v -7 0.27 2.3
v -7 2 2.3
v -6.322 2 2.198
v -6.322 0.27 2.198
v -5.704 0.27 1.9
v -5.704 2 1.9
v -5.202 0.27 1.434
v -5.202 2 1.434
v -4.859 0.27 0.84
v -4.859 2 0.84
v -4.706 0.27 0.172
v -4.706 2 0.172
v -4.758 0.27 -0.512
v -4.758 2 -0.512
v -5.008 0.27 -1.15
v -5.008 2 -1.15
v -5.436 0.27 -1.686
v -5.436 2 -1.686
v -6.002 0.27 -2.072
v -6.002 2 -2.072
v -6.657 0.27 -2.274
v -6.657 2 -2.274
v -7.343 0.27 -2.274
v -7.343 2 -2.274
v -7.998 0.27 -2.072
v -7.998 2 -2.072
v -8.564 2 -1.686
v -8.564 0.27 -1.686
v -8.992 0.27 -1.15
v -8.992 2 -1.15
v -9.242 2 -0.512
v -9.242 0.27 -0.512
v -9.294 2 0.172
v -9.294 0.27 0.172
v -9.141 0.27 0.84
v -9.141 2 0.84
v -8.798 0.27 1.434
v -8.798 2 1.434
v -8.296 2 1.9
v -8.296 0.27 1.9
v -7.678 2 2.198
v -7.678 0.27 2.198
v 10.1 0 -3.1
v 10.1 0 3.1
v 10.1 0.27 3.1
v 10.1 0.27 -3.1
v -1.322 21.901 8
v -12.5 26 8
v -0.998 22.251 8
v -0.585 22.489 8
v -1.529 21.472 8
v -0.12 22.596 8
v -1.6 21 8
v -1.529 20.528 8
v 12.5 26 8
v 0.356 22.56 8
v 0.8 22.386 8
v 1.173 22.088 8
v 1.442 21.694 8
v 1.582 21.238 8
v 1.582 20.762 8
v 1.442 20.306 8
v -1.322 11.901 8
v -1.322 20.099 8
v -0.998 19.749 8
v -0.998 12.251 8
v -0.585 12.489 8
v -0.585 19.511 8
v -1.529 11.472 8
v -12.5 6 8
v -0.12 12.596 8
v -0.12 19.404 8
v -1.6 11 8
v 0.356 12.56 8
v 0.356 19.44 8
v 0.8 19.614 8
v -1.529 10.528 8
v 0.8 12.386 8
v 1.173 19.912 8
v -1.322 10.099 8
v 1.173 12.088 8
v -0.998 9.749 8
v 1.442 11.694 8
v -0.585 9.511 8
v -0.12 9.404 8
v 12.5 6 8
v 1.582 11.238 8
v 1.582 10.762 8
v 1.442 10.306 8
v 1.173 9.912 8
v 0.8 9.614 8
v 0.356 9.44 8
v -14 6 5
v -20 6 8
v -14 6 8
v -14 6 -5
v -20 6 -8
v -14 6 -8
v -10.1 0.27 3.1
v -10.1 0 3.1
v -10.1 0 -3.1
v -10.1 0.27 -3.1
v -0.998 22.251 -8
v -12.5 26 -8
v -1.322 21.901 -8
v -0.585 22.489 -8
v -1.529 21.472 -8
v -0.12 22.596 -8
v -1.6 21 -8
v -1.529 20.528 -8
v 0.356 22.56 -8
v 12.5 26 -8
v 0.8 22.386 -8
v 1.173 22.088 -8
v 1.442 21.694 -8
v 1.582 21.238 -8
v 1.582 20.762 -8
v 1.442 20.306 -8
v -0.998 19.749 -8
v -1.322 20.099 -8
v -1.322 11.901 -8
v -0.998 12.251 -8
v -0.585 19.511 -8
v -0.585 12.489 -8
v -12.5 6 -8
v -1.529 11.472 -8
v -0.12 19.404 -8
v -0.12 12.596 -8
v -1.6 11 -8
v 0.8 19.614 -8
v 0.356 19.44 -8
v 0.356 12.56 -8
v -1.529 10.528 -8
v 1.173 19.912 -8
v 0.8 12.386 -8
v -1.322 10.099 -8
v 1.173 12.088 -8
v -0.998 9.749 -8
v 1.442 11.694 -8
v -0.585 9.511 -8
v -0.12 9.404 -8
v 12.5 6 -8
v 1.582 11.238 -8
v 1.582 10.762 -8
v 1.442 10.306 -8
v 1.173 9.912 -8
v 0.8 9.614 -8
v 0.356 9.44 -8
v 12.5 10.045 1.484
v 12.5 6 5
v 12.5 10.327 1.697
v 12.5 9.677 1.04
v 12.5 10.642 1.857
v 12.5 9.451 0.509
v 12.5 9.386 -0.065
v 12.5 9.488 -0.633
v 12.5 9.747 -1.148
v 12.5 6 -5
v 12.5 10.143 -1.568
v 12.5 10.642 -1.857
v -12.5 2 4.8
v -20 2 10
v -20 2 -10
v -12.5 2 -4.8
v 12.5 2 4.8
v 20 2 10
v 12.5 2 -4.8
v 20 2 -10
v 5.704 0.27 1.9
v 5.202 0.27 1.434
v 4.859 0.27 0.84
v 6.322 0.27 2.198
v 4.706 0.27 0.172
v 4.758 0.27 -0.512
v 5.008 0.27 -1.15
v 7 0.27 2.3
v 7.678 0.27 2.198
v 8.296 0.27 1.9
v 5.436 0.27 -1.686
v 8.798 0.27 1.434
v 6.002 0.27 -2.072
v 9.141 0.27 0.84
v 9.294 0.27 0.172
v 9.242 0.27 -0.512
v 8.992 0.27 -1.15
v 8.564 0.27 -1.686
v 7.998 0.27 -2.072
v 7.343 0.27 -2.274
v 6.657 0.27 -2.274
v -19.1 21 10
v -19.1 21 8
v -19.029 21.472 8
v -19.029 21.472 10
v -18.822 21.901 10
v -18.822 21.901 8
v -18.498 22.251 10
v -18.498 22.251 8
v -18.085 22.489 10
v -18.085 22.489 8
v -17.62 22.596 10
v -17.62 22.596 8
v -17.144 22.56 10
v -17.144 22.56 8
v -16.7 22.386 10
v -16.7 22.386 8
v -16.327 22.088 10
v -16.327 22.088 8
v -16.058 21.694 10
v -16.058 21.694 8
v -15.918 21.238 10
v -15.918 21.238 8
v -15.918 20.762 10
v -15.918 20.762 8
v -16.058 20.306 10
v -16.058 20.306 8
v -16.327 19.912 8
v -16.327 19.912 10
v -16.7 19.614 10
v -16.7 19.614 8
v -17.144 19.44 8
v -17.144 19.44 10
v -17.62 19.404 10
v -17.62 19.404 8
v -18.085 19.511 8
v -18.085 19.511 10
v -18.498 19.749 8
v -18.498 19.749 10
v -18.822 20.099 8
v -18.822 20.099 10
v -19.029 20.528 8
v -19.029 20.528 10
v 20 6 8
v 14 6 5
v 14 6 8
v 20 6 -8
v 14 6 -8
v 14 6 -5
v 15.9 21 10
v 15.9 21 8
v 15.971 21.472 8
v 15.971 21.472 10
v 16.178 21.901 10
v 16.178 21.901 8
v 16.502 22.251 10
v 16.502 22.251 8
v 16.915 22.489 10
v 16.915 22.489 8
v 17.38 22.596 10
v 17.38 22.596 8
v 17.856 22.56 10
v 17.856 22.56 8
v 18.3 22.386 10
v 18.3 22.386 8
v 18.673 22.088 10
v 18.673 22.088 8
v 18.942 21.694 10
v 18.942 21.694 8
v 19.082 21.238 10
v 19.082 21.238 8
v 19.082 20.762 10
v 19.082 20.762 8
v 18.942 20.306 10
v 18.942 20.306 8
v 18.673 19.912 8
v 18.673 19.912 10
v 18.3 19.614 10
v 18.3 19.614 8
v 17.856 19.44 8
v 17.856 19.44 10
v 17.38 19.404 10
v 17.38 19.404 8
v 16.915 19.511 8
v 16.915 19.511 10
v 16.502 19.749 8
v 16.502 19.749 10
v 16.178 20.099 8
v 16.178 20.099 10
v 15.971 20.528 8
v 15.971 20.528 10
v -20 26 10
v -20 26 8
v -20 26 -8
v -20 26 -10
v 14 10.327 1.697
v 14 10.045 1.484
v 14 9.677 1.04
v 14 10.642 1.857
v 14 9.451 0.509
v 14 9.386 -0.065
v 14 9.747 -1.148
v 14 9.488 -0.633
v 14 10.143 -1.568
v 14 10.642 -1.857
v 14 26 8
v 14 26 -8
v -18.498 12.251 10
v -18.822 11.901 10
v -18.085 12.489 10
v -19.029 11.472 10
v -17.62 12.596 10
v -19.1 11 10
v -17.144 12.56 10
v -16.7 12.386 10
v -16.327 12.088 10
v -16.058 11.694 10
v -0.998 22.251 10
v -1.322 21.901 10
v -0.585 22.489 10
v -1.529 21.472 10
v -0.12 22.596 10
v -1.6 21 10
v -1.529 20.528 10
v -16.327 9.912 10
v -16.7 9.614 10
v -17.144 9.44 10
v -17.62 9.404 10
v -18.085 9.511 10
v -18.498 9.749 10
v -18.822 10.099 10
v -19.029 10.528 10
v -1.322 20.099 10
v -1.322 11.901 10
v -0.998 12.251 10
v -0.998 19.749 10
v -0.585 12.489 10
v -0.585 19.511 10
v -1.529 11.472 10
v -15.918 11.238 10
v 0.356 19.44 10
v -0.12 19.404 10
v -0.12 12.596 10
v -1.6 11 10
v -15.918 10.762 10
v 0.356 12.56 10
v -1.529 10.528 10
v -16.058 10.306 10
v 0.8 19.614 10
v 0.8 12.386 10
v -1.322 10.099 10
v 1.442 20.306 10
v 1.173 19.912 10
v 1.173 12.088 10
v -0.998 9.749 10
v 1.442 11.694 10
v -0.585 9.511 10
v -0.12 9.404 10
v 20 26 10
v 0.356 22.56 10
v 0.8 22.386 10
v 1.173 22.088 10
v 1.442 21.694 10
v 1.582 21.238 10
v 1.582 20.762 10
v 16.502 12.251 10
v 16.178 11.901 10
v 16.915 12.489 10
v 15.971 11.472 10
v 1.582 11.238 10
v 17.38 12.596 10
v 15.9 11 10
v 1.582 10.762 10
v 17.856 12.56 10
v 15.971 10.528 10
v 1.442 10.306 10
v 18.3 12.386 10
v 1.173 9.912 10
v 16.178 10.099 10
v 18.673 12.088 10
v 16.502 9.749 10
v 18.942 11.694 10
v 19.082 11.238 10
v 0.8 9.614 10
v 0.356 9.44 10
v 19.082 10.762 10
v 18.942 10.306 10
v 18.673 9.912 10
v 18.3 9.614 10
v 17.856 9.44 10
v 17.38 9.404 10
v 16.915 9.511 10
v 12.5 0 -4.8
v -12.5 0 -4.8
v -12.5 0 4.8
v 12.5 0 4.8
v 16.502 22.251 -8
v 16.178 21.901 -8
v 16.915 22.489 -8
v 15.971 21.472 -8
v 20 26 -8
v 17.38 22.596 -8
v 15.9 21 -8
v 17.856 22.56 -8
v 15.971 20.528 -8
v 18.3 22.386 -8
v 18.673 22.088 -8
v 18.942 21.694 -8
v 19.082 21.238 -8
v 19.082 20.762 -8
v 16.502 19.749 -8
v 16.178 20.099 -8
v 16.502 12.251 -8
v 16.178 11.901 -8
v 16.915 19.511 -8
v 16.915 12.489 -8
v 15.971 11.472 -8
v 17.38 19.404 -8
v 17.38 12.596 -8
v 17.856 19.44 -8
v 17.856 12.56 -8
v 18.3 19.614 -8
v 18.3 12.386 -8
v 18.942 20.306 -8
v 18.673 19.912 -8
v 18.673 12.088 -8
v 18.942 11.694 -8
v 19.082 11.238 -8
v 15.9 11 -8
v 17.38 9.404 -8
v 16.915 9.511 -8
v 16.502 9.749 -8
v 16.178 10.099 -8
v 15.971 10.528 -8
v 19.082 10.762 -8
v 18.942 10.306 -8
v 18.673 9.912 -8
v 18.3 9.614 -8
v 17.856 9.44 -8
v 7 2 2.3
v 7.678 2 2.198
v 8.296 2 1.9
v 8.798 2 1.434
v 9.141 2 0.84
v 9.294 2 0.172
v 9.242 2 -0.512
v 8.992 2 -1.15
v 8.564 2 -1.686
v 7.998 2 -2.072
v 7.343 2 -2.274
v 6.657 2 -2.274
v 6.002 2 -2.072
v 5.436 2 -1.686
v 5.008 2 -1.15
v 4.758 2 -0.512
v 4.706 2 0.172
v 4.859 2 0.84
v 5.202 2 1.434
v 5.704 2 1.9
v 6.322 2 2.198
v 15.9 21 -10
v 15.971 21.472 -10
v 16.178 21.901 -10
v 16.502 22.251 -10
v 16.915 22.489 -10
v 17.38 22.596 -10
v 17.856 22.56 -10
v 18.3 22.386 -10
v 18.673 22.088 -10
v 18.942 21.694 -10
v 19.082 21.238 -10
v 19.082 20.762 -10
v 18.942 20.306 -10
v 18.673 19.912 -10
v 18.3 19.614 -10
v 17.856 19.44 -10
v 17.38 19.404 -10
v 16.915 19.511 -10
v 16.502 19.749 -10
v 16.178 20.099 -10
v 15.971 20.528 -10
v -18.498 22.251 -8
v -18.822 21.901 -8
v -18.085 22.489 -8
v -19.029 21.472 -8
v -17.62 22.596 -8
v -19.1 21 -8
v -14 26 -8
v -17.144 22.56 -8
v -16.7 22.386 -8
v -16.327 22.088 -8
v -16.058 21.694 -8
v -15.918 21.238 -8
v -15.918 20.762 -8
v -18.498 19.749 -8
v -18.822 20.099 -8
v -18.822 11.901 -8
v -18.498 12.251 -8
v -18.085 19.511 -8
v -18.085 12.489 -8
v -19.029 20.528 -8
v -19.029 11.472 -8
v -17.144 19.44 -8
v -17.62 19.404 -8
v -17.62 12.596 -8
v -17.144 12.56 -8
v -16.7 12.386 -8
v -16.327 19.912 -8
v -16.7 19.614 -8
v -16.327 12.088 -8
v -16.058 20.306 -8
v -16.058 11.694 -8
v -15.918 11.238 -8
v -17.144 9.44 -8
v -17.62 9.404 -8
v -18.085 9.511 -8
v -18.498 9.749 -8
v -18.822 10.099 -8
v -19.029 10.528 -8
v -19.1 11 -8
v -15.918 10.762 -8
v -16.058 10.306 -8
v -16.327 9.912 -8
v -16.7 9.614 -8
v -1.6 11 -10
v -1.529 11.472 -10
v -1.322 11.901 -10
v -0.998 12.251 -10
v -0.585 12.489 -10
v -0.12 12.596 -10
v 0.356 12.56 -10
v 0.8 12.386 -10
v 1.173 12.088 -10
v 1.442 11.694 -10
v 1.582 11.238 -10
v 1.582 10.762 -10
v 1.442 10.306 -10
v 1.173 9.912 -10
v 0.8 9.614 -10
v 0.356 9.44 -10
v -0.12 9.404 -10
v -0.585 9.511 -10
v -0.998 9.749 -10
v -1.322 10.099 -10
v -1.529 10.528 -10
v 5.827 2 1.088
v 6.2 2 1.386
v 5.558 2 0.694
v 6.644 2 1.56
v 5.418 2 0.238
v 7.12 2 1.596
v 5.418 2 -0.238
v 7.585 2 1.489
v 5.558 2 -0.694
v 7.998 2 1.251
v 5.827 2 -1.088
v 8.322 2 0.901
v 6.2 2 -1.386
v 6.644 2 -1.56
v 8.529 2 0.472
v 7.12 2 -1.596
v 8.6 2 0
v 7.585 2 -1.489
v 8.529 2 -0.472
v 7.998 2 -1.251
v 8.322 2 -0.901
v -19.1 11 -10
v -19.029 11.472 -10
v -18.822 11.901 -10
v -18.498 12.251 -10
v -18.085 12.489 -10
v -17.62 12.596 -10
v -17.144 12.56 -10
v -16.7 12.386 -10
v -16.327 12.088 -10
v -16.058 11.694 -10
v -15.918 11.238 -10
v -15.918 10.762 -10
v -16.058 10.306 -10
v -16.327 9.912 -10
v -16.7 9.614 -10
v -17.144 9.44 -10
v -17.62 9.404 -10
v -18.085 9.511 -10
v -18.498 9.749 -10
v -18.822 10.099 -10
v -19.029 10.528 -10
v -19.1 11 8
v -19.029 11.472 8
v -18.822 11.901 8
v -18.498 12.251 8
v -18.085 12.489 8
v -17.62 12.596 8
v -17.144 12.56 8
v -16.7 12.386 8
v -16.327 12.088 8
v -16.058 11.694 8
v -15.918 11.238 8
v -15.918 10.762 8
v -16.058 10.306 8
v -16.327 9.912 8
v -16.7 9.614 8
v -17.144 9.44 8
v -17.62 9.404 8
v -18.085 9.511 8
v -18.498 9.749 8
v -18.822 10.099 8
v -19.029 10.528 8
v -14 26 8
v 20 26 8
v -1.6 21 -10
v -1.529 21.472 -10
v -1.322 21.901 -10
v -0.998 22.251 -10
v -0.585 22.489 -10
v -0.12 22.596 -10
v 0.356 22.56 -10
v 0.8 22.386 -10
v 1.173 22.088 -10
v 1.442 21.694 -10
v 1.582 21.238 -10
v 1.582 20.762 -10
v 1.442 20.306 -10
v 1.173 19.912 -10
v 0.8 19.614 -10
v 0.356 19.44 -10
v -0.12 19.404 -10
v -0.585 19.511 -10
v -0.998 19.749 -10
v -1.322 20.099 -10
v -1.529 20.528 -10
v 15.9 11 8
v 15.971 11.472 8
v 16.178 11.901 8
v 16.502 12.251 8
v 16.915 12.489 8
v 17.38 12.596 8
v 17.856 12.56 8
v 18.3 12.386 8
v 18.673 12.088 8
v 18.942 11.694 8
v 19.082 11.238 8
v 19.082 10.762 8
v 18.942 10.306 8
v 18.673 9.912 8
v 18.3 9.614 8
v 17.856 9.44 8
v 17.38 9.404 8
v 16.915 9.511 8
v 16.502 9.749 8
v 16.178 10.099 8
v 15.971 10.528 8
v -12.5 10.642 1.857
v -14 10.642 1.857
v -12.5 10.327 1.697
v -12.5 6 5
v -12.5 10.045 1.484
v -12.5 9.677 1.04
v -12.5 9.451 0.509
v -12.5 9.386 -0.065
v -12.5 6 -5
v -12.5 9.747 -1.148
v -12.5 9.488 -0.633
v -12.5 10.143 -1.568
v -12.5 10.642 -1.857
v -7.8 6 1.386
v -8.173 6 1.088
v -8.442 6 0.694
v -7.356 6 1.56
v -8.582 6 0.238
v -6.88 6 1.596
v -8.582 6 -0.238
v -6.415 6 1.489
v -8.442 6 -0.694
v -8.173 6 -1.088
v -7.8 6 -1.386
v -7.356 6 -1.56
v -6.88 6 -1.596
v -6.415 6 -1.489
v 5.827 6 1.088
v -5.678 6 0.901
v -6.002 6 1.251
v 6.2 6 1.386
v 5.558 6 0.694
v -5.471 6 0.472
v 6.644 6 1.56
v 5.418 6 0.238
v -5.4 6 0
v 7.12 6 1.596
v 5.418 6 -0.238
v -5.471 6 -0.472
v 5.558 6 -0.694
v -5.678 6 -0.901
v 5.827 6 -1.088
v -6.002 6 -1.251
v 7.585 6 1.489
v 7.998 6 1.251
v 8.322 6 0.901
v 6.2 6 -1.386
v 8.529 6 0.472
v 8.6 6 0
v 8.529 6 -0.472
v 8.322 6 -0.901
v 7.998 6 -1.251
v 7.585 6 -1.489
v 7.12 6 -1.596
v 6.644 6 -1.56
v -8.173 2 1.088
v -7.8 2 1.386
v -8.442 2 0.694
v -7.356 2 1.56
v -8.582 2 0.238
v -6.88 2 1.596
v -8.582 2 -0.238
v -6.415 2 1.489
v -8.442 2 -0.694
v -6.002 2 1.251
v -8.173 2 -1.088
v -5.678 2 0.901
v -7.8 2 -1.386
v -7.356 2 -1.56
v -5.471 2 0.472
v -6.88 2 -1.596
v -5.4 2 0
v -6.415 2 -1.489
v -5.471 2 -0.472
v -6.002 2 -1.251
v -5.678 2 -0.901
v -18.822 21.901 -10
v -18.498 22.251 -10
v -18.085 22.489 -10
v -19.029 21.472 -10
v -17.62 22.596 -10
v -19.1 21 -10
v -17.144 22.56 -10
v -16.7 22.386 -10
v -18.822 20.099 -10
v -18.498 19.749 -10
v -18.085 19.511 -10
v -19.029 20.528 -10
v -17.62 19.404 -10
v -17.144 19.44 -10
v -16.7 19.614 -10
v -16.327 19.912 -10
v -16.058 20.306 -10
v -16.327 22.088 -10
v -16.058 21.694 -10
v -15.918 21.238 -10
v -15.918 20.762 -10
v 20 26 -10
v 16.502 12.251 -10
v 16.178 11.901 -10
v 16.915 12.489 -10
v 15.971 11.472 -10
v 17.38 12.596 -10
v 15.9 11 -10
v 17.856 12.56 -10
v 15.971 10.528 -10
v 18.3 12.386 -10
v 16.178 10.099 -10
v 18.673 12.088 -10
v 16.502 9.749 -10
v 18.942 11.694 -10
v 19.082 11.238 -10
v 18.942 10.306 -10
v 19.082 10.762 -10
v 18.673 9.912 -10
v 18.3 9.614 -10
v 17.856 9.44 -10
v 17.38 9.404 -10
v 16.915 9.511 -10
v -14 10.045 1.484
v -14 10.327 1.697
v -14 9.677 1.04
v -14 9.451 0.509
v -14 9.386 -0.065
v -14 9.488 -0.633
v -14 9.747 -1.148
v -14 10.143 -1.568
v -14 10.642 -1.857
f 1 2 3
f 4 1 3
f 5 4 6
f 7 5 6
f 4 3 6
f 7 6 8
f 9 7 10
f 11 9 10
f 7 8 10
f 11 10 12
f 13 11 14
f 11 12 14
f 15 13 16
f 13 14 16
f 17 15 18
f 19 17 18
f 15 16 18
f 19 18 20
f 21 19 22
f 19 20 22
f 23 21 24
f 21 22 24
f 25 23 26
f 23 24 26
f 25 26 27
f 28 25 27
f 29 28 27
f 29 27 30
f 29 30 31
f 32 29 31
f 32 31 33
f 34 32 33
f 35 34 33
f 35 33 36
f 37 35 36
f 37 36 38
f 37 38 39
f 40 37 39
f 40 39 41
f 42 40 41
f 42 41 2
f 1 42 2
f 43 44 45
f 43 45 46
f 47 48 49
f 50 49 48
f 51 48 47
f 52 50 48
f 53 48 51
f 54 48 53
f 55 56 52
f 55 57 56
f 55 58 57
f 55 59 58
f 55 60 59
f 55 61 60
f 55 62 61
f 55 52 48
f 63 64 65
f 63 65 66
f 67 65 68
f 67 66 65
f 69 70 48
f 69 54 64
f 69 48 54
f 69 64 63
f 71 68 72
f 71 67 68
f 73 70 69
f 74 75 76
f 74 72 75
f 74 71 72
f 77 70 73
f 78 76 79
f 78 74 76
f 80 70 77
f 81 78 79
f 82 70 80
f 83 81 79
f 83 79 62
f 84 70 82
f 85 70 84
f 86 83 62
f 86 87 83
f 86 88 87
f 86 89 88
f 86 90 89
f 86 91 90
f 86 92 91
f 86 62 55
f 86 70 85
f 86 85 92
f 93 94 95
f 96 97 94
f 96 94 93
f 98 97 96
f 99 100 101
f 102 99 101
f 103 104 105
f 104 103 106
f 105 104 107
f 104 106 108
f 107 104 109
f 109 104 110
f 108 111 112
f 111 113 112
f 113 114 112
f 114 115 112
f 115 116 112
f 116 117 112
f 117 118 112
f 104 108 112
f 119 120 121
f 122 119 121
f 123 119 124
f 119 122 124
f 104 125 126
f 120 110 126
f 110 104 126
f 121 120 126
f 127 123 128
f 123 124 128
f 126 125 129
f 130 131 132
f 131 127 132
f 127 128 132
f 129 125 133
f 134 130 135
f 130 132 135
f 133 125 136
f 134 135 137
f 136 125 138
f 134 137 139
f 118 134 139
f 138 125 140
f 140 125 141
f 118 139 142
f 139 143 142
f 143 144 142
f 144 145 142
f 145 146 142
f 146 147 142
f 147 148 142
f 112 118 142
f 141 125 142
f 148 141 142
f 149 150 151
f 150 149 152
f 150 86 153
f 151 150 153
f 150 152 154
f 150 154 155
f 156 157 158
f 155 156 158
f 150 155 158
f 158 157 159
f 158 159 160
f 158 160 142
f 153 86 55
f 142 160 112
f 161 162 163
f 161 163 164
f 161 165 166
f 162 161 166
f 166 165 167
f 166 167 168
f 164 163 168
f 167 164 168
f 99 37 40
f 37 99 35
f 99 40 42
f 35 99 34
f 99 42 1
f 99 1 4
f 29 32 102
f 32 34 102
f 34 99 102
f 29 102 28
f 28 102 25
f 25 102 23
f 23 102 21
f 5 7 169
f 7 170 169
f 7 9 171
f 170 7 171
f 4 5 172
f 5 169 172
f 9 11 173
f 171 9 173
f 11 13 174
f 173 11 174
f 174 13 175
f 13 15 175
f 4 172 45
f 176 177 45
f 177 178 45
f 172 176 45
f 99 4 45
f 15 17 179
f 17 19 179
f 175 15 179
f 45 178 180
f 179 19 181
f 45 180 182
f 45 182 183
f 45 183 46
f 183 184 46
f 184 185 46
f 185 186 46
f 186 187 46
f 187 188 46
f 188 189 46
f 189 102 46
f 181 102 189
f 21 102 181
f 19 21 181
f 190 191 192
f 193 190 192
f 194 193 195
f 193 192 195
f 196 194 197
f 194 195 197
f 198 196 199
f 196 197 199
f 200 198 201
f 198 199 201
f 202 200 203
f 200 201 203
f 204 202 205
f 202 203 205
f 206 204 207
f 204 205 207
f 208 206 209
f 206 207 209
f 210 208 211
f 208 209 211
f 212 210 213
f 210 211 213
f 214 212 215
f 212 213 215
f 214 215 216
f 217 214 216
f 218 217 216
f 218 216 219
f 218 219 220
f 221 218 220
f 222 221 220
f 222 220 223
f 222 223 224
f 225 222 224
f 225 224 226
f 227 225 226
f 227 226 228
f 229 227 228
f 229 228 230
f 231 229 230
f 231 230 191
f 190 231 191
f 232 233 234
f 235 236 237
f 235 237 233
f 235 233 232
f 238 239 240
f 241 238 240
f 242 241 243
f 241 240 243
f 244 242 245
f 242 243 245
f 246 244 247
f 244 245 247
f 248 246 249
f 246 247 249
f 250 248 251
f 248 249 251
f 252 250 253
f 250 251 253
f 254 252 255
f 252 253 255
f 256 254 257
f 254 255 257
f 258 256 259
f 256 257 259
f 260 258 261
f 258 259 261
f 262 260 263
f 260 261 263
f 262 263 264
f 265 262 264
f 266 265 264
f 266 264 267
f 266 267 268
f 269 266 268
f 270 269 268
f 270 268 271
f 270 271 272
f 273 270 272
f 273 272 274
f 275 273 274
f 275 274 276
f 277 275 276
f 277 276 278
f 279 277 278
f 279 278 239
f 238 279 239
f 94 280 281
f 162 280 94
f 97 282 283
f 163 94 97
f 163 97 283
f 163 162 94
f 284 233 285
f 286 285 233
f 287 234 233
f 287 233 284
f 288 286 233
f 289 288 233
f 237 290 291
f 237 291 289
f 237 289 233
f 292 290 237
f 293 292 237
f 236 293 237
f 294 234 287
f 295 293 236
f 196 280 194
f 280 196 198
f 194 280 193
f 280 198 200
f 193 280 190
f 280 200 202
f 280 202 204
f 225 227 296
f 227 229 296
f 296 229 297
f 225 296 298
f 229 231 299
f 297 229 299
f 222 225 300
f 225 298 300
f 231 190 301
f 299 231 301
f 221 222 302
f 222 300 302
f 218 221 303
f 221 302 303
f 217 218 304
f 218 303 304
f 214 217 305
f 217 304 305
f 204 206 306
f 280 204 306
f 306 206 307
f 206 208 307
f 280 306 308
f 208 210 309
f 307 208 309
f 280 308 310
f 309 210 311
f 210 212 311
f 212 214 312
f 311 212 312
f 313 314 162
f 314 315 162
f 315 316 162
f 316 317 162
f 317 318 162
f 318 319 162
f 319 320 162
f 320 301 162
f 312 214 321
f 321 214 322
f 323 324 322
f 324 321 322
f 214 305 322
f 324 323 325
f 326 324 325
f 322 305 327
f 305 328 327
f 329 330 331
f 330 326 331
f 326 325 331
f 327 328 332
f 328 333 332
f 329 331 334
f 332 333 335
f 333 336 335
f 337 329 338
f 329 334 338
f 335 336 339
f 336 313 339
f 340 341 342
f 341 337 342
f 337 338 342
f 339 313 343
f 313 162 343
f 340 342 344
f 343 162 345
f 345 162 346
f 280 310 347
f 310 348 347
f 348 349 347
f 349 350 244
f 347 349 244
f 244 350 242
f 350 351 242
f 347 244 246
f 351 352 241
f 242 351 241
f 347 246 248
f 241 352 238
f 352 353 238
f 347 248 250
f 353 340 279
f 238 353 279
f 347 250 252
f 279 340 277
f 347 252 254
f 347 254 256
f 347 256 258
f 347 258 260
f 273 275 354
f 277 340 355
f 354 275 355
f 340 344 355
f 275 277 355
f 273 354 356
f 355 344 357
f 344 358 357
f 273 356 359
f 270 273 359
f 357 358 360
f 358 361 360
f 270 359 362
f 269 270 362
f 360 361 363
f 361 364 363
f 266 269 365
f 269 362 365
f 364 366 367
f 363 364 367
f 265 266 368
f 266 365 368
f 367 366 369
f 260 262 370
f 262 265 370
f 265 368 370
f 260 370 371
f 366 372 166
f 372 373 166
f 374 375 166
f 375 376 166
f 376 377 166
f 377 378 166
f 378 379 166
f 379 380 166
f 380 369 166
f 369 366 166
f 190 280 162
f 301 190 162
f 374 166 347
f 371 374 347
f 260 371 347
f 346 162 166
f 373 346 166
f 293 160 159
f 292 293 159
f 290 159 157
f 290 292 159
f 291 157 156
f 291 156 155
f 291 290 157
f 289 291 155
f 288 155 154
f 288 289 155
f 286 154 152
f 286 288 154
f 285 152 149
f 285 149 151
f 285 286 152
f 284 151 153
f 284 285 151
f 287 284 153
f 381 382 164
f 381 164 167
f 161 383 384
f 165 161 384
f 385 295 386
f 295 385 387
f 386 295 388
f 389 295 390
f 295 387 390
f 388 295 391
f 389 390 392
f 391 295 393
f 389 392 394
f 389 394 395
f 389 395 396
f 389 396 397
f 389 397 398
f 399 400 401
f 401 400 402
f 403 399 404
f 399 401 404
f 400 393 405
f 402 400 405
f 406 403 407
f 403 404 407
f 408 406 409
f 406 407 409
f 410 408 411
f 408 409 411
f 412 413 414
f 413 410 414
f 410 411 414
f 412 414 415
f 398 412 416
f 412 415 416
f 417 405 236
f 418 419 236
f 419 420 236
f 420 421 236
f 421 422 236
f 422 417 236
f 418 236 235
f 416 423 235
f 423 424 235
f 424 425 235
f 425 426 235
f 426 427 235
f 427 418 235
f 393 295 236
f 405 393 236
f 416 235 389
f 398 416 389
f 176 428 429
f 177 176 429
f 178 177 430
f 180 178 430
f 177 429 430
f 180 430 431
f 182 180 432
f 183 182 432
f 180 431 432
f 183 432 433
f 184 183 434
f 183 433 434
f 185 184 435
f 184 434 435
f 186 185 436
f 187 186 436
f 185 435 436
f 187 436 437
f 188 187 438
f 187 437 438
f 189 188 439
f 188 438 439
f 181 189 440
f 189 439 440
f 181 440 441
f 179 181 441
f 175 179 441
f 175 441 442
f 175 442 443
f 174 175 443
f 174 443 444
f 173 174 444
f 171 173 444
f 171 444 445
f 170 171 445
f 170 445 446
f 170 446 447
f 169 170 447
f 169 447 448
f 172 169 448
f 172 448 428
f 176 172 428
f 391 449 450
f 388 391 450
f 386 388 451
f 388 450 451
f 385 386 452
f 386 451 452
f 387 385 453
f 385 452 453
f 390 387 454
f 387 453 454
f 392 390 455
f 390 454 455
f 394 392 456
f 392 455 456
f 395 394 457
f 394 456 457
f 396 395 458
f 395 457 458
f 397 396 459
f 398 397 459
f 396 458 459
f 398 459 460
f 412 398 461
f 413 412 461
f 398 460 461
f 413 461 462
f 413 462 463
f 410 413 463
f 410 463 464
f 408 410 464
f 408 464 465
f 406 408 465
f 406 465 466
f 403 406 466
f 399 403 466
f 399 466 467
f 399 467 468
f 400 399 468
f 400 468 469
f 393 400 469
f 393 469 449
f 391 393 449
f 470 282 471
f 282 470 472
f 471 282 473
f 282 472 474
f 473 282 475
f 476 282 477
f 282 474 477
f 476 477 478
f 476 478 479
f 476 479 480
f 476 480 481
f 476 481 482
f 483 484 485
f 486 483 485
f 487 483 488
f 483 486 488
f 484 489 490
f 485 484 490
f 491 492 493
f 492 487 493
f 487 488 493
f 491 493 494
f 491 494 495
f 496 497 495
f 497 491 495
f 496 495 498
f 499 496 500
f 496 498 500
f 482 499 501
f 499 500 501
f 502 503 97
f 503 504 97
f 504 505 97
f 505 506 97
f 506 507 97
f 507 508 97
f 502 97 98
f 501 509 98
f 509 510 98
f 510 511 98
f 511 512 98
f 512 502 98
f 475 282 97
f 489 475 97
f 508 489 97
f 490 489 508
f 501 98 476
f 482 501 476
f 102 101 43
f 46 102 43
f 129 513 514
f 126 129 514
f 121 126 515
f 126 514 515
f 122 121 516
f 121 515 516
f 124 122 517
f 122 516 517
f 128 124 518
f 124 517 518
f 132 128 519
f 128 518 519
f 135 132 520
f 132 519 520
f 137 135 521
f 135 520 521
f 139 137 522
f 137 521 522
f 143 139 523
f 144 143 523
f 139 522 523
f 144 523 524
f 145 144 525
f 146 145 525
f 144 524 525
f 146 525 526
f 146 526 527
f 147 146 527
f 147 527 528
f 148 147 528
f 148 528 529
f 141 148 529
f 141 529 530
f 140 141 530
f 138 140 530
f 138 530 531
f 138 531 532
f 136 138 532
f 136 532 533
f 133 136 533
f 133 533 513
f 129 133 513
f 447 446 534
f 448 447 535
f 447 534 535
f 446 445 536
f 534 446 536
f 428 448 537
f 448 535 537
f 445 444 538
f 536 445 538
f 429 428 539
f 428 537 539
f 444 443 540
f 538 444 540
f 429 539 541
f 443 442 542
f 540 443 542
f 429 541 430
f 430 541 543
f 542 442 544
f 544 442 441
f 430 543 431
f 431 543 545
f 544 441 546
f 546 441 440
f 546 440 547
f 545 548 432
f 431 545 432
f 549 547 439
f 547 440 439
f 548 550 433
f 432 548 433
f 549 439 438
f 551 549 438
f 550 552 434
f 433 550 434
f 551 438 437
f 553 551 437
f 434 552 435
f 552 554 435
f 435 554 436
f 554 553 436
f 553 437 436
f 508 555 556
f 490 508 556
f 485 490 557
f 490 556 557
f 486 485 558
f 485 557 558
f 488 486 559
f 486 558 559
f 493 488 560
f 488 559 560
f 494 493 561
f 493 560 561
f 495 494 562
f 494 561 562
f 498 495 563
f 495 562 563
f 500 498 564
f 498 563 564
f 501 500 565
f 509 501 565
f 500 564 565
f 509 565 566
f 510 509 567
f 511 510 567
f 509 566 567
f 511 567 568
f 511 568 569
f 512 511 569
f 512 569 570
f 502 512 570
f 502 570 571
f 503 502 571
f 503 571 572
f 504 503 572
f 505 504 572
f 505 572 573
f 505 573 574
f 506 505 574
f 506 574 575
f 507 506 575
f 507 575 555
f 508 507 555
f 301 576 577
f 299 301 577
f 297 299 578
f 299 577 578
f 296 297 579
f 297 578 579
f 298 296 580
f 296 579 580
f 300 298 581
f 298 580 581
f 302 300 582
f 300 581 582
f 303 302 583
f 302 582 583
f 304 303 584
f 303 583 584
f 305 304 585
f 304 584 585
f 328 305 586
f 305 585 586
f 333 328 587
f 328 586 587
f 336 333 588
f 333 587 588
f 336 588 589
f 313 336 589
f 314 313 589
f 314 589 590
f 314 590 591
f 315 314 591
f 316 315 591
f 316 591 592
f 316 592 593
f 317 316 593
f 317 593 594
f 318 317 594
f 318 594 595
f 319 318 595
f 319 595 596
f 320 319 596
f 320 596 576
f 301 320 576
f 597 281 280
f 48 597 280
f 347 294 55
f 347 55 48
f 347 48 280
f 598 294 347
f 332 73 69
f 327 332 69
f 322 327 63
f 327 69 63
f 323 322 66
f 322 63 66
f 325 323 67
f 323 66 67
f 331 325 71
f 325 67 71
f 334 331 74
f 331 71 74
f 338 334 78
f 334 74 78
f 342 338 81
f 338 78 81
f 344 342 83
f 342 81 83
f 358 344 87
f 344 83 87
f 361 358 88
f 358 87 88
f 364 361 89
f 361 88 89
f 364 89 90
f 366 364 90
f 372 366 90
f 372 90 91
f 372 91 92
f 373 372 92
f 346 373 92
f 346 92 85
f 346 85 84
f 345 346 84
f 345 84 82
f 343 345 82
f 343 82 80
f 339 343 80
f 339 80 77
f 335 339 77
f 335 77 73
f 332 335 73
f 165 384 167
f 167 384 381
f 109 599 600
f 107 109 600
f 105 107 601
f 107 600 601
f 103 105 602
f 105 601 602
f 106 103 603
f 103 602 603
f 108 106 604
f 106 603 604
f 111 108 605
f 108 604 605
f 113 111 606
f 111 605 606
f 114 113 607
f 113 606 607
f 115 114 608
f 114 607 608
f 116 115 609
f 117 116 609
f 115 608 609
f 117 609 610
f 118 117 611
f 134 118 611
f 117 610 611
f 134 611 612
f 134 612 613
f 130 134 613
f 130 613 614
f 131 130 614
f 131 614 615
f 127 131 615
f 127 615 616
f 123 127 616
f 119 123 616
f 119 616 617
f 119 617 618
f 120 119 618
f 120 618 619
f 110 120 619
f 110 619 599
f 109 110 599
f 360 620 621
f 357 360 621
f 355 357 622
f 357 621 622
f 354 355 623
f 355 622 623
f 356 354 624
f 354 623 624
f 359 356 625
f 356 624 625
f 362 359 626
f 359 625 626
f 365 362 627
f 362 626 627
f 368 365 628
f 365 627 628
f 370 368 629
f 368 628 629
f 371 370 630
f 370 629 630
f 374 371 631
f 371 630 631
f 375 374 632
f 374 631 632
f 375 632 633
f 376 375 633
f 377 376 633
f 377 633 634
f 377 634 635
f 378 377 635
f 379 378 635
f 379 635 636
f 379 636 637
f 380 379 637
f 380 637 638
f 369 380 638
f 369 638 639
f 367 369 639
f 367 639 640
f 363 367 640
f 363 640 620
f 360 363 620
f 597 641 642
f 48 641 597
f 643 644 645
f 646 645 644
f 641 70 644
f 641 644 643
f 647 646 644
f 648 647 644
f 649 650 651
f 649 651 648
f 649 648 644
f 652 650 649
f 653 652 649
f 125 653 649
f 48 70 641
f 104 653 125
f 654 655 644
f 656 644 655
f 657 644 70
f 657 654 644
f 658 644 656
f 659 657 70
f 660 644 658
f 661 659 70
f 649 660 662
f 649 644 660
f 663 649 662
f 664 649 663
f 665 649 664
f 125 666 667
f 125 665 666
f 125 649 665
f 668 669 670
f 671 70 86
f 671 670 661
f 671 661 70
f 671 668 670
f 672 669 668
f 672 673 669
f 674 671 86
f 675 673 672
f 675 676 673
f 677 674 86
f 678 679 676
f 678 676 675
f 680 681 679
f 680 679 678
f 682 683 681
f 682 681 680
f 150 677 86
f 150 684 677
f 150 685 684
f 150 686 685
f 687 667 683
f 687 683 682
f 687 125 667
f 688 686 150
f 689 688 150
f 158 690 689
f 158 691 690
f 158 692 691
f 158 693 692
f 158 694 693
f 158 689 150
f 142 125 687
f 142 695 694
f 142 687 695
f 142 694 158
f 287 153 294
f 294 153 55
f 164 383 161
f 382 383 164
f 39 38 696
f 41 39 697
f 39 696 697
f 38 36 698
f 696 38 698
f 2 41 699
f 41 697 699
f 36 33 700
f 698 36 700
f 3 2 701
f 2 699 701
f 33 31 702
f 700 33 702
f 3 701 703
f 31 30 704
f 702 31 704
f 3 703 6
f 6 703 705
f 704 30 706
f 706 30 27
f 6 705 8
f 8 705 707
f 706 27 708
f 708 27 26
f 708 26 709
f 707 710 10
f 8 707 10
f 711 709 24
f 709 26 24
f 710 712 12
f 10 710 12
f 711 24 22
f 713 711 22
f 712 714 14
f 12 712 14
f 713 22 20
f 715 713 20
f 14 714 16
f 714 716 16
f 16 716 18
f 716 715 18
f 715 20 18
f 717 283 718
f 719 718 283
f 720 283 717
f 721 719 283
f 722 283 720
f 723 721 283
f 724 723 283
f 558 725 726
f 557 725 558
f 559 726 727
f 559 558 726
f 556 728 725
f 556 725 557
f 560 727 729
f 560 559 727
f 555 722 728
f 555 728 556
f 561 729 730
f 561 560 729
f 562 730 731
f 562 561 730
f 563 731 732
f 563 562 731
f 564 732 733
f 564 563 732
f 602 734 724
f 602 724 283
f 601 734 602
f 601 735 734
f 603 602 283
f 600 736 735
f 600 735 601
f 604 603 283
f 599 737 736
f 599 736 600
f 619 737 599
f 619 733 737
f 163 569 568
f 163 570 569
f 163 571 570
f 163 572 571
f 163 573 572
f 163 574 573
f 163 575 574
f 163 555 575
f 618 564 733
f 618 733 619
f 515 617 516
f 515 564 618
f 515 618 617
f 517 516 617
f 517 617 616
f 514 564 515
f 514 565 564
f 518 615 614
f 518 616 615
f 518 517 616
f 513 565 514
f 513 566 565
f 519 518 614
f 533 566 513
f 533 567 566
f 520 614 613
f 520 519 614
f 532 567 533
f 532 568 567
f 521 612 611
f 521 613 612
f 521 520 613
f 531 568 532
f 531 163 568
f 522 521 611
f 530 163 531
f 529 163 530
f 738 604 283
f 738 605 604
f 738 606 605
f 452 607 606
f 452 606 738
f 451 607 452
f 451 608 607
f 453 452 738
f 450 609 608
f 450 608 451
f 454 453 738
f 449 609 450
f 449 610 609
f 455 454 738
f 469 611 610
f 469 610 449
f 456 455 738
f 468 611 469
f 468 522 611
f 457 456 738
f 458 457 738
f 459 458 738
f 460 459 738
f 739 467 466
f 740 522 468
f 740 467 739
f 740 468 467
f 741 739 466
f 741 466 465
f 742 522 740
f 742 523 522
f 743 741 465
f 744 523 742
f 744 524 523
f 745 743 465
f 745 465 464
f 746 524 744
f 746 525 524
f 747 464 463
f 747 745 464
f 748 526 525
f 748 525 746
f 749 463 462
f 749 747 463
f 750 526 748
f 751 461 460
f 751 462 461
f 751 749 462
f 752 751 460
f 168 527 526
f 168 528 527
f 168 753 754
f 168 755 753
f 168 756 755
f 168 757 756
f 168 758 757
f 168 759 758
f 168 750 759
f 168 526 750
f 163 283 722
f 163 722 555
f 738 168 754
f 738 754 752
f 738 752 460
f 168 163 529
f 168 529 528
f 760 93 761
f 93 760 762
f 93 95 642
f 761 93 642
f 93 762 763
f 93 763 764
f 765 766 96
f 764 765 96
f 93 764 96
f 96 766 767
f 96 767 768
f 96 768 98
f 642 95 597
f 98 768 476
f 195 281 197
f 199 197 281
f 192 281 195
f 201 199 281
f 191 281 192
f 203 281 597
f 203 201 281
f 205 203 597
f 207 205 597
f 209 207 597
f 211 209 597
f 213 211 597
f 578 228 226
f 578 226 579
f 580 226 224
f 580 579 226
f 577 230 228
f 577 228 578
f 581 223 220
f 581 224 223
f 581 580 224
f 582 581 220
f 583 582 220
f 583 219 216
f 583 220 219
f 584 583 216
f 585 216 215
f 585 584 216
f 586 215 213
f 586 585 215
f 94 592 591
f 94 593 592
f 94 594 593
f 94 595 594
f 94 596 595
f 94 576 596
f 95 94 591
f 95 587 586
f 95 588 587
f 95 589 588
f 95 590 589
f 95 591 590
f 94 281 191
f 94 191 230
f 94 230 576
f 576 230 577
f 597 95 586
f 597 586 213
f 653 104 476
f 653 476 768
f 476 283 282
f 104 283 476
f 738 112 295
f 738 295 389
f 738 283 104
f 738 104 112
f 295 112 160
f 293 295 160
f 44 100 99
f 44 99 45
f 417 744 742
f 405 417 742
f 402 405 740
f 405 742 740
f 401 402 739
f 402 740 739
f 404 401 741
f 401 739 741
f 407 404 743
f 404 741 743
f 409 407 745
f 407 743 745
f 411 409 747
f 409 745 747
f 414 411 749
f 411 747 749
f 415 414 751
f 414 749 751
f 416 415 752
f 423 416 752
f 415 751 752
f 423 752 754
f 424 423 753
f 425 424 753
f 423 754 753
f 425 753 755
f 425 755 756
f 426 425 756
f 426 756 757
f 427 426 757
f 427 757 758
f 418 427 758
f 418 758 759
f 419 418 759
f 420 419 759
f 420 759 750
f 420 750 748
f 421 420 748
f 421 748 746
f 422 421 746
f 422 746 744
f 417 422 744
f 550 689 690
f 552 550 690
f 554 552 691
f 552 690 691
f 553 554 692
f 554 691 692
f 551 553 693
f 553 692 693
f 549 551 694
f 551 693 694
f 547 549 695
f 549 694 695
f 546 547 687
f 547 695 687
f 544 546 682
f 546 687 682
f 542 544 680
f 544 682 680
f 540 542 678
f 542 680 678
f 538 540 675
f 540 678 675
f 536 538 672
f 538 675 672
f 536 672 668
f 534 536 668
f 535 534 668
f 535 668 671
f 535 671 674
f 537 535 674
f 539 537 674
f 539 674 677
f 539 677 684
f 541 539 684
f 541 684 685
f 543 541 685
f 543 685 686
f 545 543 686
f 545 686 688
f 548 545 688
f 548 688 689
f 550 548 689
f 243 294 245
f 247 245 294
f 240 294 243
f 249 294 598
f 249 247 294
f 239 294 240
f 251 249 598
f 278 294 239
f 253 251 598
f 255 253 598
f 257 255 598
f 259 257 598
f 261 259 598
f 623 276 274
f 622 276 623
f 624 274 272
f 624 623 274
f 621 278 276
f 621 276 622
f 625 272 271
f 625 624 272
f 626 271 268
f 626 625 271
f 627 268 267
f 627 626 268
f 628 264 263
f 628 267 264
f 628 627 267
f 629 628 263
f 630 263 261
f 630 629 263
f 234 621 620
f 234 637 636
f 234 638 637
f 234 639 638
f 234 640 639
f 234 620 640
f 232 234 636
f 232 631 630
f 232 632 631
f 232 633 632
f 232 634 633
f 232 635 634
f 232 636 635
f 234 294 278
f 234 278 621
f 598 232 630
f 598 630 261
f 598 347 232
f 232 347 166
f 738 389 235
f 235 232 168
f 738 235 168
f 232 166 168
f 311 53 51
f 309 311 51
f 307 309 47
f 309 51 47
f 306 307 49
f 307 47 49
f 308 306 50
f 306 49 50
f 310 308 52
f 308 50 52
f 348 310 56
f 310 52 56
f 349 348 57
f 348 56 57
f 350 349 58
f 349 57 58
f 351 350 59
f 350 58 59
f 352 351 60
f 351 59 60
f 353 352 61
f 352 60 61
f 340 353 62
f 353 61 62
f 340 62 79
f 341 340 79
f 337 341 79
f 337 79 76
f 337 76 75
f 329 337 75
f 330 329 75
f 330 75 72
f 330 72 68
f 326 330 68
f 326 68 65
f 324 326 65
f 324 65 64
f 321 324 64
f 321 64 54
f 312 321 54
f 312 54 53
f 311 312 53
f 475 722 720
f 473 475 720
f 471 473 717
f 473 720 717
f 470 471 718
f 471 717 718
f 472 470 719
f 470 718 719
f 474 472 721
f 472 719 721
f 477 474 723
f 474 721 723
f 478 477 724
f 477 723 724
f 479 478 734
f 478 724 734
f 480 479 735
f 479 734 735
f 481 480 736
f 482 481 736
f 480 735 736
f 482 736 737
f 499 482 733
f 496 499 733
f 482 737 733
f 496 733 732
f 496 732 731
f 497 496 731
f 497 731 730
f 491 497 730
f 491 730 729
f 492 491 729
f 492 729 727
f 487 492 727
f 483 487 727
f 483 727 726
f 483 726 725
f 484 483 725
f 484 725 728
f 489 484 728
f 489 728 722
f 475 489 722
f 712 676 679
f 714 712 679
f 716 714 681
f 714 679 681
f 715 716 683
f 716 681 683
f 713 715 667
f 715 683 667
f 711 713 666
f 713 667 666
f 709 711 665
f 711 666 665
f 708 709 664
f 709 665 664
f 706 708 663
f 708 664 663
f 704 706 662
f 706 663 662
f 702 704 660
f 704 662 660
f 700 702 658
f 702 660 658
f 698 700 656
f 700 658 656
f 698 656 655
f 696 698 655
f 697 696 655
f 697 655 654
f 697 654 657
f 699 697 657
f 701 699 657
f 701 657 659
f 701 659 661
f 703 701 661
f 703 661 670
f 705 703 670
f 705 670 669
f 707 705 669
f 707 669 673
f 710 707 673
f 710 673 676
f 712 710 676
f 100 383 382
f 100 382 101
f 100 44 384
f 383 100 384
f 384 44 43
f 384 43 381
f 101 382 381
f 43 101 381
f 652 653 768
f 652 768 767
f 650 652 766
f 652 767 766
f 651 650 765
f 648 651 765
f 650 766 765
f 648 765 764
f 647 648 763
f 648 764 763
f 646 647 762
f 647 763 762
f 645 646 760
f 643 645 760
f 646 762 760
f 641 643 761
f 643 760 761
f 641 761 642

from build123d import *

# Parameters (mm, degrees)
SKETCH1_W            = 25
SKETCH1_H            = 9.6
BOSS_EXTRUDE1_DEPTH  = 2
SKETCH3_R            = 2.3
CUT_EXTRUDE1_DEPTH   = 14.538463724
SKETCH4_W            = 20.2
SKETCH4_H            = 6.2
CUT_EXTRUDE2_DEPTH   = 0.27
SKETCH5_W            = 40
SKETCH5_H            = 20
BOSS_EXTRUDE2_DEPTH  = 4
M3_CLEARANCE_HOLE1_D = 3.2
SKETCH9_W            = 40
SKETCH9_H            = 2
BOSS_EXTRUDE4_DEPTH  = 20
BOSS_EXTRUDE5_DEPTH  = 1.5
FILLET1_R            = 2
FILLET1_OF_MIRROR1_R = 2
M3_CLEARANCE_HOLE2_D = 3.2


with BuildPart() as part:
    # Sketch1 → Boss-Extrude1 (new body)
    with BuildSketch(Plane(origin=(0, 0, 0), x_dir=(1, 0, 0), z_dir=(0, 1, 0))):
        Rectangle(SKETCH1_W, SKETCH1_H)
    extrude(amount=BOSS_EXTRUDE1_DEPTH)

    # Sketch3 → Cut-Extrude1 (cut, through all)
    with BuildSketch(Plane(origin=(0, 2, 0), x_dir=(1, 0, 0), z_dir=(0, 1, 0))):
        with Locations(Location((-7, 0, 0), (0, 0, 270))):
            Circle(SKETCH3_R)
        with Locations(Location((7, 0, 0), (0, 0, 270))):
            Circle(SKETCH3_R)
    extrude(amount=-CUT_EXTRUDE1_DEPTH, mode=Mode.SUBTRACT)

    # Sketch4 → Cut-Extrude2 (cut)
    with BuildSketch(Plane(origin=(0, 0, 0), x_dir=(1, 0, 0), z_dir=(0, 1, 0))):
        Rectangle(SKETCH4_W, SKETCH4_H)
    extrude(amount=CUT_EXTRUDE2_DEPTH, mode=Mode.SUBTRACT)

    # Sketch5 → Boss-Extrude2 (add)
    with BuildSketch(Plane(origin=(0, 2, 0), x_dir=(1, 0, 0), z_dir=(0, 1, 0))):
        Rectangle(SKETCH5_W, SKETCH5_H)
    extrude(amount=BOSS_EXTRUDE2_DEPTH)

    # M3 Clearance Hole1 (through all)
    with Locations(Plane(origin=(0, 2, 0), x_dir=(-1, 0, 0), z_dir=(0, -1, 0))):
        with Locations((-7, 0), (7, 0)):
            Hole(M3_CLEARANCE_HOLE1_D / 2)

    # Sketch9 → Boss-Extrude4 (add)
    with BuildSketch(Plane(origin=(0, 6, 0), x_dir=(1, 0, 0), z_dir=(0, 1, 0))):
        with Locations((0, 9)):
            Rectangle(SKETCH9_W, SKETCH9_H)
        with Locations((0, -9)):
            Rectangle(SKETCH9_W, SKETCH9_H)
    extrude(amount=BOSS_EXTRUDE4_DEPTH)

    # Sketch10 → Boss-Extrude5 (add)
    with BuildSketch(Plane.ZY.offset(12.5)):
        Polygon((-8, 6), (-8, 26), (0, 6), align=None)
        Polygon((8, 6), (0, 6), (8, 26), align=None)
    boss_extrude5 = extrude(amount=BOSS_EXTRUDE5_DEPTH)

    # Fillet1
    fillet1_edges = [part.edges().sort_by_distance(p)[0] for p in [
        (-13.25, 6, 0),
    ]]
    fillet(fillet1_edges, radius=FILLET1_R)

    # Mirror1: Boss-Extrude5 across plane
    add(boss_extrude5.mirror(Plane.ZY))

    # Fillet1 of Mirror1
    fillet1_of_mirror1_edges = [part.edges().sort_by_distance(p)[0] for p in [
        (13.25, 6, 0),
    ]]
    fillet(fillet1_of_mirror1_edges, radius=FILLET1_OF_MIRROR1_R)

    # M3 Clearance Hole2 (through all)
    with Locations(Plane.XY.offset(10)):
        with Locations((-17.5, 21), (17.5, 21), (17.5, 11), (-17.5, 11), (0, 21), (0, 11)):
            Hole(M3_CLEARANCE_HOLE2_D / 2)


solid = part.part
